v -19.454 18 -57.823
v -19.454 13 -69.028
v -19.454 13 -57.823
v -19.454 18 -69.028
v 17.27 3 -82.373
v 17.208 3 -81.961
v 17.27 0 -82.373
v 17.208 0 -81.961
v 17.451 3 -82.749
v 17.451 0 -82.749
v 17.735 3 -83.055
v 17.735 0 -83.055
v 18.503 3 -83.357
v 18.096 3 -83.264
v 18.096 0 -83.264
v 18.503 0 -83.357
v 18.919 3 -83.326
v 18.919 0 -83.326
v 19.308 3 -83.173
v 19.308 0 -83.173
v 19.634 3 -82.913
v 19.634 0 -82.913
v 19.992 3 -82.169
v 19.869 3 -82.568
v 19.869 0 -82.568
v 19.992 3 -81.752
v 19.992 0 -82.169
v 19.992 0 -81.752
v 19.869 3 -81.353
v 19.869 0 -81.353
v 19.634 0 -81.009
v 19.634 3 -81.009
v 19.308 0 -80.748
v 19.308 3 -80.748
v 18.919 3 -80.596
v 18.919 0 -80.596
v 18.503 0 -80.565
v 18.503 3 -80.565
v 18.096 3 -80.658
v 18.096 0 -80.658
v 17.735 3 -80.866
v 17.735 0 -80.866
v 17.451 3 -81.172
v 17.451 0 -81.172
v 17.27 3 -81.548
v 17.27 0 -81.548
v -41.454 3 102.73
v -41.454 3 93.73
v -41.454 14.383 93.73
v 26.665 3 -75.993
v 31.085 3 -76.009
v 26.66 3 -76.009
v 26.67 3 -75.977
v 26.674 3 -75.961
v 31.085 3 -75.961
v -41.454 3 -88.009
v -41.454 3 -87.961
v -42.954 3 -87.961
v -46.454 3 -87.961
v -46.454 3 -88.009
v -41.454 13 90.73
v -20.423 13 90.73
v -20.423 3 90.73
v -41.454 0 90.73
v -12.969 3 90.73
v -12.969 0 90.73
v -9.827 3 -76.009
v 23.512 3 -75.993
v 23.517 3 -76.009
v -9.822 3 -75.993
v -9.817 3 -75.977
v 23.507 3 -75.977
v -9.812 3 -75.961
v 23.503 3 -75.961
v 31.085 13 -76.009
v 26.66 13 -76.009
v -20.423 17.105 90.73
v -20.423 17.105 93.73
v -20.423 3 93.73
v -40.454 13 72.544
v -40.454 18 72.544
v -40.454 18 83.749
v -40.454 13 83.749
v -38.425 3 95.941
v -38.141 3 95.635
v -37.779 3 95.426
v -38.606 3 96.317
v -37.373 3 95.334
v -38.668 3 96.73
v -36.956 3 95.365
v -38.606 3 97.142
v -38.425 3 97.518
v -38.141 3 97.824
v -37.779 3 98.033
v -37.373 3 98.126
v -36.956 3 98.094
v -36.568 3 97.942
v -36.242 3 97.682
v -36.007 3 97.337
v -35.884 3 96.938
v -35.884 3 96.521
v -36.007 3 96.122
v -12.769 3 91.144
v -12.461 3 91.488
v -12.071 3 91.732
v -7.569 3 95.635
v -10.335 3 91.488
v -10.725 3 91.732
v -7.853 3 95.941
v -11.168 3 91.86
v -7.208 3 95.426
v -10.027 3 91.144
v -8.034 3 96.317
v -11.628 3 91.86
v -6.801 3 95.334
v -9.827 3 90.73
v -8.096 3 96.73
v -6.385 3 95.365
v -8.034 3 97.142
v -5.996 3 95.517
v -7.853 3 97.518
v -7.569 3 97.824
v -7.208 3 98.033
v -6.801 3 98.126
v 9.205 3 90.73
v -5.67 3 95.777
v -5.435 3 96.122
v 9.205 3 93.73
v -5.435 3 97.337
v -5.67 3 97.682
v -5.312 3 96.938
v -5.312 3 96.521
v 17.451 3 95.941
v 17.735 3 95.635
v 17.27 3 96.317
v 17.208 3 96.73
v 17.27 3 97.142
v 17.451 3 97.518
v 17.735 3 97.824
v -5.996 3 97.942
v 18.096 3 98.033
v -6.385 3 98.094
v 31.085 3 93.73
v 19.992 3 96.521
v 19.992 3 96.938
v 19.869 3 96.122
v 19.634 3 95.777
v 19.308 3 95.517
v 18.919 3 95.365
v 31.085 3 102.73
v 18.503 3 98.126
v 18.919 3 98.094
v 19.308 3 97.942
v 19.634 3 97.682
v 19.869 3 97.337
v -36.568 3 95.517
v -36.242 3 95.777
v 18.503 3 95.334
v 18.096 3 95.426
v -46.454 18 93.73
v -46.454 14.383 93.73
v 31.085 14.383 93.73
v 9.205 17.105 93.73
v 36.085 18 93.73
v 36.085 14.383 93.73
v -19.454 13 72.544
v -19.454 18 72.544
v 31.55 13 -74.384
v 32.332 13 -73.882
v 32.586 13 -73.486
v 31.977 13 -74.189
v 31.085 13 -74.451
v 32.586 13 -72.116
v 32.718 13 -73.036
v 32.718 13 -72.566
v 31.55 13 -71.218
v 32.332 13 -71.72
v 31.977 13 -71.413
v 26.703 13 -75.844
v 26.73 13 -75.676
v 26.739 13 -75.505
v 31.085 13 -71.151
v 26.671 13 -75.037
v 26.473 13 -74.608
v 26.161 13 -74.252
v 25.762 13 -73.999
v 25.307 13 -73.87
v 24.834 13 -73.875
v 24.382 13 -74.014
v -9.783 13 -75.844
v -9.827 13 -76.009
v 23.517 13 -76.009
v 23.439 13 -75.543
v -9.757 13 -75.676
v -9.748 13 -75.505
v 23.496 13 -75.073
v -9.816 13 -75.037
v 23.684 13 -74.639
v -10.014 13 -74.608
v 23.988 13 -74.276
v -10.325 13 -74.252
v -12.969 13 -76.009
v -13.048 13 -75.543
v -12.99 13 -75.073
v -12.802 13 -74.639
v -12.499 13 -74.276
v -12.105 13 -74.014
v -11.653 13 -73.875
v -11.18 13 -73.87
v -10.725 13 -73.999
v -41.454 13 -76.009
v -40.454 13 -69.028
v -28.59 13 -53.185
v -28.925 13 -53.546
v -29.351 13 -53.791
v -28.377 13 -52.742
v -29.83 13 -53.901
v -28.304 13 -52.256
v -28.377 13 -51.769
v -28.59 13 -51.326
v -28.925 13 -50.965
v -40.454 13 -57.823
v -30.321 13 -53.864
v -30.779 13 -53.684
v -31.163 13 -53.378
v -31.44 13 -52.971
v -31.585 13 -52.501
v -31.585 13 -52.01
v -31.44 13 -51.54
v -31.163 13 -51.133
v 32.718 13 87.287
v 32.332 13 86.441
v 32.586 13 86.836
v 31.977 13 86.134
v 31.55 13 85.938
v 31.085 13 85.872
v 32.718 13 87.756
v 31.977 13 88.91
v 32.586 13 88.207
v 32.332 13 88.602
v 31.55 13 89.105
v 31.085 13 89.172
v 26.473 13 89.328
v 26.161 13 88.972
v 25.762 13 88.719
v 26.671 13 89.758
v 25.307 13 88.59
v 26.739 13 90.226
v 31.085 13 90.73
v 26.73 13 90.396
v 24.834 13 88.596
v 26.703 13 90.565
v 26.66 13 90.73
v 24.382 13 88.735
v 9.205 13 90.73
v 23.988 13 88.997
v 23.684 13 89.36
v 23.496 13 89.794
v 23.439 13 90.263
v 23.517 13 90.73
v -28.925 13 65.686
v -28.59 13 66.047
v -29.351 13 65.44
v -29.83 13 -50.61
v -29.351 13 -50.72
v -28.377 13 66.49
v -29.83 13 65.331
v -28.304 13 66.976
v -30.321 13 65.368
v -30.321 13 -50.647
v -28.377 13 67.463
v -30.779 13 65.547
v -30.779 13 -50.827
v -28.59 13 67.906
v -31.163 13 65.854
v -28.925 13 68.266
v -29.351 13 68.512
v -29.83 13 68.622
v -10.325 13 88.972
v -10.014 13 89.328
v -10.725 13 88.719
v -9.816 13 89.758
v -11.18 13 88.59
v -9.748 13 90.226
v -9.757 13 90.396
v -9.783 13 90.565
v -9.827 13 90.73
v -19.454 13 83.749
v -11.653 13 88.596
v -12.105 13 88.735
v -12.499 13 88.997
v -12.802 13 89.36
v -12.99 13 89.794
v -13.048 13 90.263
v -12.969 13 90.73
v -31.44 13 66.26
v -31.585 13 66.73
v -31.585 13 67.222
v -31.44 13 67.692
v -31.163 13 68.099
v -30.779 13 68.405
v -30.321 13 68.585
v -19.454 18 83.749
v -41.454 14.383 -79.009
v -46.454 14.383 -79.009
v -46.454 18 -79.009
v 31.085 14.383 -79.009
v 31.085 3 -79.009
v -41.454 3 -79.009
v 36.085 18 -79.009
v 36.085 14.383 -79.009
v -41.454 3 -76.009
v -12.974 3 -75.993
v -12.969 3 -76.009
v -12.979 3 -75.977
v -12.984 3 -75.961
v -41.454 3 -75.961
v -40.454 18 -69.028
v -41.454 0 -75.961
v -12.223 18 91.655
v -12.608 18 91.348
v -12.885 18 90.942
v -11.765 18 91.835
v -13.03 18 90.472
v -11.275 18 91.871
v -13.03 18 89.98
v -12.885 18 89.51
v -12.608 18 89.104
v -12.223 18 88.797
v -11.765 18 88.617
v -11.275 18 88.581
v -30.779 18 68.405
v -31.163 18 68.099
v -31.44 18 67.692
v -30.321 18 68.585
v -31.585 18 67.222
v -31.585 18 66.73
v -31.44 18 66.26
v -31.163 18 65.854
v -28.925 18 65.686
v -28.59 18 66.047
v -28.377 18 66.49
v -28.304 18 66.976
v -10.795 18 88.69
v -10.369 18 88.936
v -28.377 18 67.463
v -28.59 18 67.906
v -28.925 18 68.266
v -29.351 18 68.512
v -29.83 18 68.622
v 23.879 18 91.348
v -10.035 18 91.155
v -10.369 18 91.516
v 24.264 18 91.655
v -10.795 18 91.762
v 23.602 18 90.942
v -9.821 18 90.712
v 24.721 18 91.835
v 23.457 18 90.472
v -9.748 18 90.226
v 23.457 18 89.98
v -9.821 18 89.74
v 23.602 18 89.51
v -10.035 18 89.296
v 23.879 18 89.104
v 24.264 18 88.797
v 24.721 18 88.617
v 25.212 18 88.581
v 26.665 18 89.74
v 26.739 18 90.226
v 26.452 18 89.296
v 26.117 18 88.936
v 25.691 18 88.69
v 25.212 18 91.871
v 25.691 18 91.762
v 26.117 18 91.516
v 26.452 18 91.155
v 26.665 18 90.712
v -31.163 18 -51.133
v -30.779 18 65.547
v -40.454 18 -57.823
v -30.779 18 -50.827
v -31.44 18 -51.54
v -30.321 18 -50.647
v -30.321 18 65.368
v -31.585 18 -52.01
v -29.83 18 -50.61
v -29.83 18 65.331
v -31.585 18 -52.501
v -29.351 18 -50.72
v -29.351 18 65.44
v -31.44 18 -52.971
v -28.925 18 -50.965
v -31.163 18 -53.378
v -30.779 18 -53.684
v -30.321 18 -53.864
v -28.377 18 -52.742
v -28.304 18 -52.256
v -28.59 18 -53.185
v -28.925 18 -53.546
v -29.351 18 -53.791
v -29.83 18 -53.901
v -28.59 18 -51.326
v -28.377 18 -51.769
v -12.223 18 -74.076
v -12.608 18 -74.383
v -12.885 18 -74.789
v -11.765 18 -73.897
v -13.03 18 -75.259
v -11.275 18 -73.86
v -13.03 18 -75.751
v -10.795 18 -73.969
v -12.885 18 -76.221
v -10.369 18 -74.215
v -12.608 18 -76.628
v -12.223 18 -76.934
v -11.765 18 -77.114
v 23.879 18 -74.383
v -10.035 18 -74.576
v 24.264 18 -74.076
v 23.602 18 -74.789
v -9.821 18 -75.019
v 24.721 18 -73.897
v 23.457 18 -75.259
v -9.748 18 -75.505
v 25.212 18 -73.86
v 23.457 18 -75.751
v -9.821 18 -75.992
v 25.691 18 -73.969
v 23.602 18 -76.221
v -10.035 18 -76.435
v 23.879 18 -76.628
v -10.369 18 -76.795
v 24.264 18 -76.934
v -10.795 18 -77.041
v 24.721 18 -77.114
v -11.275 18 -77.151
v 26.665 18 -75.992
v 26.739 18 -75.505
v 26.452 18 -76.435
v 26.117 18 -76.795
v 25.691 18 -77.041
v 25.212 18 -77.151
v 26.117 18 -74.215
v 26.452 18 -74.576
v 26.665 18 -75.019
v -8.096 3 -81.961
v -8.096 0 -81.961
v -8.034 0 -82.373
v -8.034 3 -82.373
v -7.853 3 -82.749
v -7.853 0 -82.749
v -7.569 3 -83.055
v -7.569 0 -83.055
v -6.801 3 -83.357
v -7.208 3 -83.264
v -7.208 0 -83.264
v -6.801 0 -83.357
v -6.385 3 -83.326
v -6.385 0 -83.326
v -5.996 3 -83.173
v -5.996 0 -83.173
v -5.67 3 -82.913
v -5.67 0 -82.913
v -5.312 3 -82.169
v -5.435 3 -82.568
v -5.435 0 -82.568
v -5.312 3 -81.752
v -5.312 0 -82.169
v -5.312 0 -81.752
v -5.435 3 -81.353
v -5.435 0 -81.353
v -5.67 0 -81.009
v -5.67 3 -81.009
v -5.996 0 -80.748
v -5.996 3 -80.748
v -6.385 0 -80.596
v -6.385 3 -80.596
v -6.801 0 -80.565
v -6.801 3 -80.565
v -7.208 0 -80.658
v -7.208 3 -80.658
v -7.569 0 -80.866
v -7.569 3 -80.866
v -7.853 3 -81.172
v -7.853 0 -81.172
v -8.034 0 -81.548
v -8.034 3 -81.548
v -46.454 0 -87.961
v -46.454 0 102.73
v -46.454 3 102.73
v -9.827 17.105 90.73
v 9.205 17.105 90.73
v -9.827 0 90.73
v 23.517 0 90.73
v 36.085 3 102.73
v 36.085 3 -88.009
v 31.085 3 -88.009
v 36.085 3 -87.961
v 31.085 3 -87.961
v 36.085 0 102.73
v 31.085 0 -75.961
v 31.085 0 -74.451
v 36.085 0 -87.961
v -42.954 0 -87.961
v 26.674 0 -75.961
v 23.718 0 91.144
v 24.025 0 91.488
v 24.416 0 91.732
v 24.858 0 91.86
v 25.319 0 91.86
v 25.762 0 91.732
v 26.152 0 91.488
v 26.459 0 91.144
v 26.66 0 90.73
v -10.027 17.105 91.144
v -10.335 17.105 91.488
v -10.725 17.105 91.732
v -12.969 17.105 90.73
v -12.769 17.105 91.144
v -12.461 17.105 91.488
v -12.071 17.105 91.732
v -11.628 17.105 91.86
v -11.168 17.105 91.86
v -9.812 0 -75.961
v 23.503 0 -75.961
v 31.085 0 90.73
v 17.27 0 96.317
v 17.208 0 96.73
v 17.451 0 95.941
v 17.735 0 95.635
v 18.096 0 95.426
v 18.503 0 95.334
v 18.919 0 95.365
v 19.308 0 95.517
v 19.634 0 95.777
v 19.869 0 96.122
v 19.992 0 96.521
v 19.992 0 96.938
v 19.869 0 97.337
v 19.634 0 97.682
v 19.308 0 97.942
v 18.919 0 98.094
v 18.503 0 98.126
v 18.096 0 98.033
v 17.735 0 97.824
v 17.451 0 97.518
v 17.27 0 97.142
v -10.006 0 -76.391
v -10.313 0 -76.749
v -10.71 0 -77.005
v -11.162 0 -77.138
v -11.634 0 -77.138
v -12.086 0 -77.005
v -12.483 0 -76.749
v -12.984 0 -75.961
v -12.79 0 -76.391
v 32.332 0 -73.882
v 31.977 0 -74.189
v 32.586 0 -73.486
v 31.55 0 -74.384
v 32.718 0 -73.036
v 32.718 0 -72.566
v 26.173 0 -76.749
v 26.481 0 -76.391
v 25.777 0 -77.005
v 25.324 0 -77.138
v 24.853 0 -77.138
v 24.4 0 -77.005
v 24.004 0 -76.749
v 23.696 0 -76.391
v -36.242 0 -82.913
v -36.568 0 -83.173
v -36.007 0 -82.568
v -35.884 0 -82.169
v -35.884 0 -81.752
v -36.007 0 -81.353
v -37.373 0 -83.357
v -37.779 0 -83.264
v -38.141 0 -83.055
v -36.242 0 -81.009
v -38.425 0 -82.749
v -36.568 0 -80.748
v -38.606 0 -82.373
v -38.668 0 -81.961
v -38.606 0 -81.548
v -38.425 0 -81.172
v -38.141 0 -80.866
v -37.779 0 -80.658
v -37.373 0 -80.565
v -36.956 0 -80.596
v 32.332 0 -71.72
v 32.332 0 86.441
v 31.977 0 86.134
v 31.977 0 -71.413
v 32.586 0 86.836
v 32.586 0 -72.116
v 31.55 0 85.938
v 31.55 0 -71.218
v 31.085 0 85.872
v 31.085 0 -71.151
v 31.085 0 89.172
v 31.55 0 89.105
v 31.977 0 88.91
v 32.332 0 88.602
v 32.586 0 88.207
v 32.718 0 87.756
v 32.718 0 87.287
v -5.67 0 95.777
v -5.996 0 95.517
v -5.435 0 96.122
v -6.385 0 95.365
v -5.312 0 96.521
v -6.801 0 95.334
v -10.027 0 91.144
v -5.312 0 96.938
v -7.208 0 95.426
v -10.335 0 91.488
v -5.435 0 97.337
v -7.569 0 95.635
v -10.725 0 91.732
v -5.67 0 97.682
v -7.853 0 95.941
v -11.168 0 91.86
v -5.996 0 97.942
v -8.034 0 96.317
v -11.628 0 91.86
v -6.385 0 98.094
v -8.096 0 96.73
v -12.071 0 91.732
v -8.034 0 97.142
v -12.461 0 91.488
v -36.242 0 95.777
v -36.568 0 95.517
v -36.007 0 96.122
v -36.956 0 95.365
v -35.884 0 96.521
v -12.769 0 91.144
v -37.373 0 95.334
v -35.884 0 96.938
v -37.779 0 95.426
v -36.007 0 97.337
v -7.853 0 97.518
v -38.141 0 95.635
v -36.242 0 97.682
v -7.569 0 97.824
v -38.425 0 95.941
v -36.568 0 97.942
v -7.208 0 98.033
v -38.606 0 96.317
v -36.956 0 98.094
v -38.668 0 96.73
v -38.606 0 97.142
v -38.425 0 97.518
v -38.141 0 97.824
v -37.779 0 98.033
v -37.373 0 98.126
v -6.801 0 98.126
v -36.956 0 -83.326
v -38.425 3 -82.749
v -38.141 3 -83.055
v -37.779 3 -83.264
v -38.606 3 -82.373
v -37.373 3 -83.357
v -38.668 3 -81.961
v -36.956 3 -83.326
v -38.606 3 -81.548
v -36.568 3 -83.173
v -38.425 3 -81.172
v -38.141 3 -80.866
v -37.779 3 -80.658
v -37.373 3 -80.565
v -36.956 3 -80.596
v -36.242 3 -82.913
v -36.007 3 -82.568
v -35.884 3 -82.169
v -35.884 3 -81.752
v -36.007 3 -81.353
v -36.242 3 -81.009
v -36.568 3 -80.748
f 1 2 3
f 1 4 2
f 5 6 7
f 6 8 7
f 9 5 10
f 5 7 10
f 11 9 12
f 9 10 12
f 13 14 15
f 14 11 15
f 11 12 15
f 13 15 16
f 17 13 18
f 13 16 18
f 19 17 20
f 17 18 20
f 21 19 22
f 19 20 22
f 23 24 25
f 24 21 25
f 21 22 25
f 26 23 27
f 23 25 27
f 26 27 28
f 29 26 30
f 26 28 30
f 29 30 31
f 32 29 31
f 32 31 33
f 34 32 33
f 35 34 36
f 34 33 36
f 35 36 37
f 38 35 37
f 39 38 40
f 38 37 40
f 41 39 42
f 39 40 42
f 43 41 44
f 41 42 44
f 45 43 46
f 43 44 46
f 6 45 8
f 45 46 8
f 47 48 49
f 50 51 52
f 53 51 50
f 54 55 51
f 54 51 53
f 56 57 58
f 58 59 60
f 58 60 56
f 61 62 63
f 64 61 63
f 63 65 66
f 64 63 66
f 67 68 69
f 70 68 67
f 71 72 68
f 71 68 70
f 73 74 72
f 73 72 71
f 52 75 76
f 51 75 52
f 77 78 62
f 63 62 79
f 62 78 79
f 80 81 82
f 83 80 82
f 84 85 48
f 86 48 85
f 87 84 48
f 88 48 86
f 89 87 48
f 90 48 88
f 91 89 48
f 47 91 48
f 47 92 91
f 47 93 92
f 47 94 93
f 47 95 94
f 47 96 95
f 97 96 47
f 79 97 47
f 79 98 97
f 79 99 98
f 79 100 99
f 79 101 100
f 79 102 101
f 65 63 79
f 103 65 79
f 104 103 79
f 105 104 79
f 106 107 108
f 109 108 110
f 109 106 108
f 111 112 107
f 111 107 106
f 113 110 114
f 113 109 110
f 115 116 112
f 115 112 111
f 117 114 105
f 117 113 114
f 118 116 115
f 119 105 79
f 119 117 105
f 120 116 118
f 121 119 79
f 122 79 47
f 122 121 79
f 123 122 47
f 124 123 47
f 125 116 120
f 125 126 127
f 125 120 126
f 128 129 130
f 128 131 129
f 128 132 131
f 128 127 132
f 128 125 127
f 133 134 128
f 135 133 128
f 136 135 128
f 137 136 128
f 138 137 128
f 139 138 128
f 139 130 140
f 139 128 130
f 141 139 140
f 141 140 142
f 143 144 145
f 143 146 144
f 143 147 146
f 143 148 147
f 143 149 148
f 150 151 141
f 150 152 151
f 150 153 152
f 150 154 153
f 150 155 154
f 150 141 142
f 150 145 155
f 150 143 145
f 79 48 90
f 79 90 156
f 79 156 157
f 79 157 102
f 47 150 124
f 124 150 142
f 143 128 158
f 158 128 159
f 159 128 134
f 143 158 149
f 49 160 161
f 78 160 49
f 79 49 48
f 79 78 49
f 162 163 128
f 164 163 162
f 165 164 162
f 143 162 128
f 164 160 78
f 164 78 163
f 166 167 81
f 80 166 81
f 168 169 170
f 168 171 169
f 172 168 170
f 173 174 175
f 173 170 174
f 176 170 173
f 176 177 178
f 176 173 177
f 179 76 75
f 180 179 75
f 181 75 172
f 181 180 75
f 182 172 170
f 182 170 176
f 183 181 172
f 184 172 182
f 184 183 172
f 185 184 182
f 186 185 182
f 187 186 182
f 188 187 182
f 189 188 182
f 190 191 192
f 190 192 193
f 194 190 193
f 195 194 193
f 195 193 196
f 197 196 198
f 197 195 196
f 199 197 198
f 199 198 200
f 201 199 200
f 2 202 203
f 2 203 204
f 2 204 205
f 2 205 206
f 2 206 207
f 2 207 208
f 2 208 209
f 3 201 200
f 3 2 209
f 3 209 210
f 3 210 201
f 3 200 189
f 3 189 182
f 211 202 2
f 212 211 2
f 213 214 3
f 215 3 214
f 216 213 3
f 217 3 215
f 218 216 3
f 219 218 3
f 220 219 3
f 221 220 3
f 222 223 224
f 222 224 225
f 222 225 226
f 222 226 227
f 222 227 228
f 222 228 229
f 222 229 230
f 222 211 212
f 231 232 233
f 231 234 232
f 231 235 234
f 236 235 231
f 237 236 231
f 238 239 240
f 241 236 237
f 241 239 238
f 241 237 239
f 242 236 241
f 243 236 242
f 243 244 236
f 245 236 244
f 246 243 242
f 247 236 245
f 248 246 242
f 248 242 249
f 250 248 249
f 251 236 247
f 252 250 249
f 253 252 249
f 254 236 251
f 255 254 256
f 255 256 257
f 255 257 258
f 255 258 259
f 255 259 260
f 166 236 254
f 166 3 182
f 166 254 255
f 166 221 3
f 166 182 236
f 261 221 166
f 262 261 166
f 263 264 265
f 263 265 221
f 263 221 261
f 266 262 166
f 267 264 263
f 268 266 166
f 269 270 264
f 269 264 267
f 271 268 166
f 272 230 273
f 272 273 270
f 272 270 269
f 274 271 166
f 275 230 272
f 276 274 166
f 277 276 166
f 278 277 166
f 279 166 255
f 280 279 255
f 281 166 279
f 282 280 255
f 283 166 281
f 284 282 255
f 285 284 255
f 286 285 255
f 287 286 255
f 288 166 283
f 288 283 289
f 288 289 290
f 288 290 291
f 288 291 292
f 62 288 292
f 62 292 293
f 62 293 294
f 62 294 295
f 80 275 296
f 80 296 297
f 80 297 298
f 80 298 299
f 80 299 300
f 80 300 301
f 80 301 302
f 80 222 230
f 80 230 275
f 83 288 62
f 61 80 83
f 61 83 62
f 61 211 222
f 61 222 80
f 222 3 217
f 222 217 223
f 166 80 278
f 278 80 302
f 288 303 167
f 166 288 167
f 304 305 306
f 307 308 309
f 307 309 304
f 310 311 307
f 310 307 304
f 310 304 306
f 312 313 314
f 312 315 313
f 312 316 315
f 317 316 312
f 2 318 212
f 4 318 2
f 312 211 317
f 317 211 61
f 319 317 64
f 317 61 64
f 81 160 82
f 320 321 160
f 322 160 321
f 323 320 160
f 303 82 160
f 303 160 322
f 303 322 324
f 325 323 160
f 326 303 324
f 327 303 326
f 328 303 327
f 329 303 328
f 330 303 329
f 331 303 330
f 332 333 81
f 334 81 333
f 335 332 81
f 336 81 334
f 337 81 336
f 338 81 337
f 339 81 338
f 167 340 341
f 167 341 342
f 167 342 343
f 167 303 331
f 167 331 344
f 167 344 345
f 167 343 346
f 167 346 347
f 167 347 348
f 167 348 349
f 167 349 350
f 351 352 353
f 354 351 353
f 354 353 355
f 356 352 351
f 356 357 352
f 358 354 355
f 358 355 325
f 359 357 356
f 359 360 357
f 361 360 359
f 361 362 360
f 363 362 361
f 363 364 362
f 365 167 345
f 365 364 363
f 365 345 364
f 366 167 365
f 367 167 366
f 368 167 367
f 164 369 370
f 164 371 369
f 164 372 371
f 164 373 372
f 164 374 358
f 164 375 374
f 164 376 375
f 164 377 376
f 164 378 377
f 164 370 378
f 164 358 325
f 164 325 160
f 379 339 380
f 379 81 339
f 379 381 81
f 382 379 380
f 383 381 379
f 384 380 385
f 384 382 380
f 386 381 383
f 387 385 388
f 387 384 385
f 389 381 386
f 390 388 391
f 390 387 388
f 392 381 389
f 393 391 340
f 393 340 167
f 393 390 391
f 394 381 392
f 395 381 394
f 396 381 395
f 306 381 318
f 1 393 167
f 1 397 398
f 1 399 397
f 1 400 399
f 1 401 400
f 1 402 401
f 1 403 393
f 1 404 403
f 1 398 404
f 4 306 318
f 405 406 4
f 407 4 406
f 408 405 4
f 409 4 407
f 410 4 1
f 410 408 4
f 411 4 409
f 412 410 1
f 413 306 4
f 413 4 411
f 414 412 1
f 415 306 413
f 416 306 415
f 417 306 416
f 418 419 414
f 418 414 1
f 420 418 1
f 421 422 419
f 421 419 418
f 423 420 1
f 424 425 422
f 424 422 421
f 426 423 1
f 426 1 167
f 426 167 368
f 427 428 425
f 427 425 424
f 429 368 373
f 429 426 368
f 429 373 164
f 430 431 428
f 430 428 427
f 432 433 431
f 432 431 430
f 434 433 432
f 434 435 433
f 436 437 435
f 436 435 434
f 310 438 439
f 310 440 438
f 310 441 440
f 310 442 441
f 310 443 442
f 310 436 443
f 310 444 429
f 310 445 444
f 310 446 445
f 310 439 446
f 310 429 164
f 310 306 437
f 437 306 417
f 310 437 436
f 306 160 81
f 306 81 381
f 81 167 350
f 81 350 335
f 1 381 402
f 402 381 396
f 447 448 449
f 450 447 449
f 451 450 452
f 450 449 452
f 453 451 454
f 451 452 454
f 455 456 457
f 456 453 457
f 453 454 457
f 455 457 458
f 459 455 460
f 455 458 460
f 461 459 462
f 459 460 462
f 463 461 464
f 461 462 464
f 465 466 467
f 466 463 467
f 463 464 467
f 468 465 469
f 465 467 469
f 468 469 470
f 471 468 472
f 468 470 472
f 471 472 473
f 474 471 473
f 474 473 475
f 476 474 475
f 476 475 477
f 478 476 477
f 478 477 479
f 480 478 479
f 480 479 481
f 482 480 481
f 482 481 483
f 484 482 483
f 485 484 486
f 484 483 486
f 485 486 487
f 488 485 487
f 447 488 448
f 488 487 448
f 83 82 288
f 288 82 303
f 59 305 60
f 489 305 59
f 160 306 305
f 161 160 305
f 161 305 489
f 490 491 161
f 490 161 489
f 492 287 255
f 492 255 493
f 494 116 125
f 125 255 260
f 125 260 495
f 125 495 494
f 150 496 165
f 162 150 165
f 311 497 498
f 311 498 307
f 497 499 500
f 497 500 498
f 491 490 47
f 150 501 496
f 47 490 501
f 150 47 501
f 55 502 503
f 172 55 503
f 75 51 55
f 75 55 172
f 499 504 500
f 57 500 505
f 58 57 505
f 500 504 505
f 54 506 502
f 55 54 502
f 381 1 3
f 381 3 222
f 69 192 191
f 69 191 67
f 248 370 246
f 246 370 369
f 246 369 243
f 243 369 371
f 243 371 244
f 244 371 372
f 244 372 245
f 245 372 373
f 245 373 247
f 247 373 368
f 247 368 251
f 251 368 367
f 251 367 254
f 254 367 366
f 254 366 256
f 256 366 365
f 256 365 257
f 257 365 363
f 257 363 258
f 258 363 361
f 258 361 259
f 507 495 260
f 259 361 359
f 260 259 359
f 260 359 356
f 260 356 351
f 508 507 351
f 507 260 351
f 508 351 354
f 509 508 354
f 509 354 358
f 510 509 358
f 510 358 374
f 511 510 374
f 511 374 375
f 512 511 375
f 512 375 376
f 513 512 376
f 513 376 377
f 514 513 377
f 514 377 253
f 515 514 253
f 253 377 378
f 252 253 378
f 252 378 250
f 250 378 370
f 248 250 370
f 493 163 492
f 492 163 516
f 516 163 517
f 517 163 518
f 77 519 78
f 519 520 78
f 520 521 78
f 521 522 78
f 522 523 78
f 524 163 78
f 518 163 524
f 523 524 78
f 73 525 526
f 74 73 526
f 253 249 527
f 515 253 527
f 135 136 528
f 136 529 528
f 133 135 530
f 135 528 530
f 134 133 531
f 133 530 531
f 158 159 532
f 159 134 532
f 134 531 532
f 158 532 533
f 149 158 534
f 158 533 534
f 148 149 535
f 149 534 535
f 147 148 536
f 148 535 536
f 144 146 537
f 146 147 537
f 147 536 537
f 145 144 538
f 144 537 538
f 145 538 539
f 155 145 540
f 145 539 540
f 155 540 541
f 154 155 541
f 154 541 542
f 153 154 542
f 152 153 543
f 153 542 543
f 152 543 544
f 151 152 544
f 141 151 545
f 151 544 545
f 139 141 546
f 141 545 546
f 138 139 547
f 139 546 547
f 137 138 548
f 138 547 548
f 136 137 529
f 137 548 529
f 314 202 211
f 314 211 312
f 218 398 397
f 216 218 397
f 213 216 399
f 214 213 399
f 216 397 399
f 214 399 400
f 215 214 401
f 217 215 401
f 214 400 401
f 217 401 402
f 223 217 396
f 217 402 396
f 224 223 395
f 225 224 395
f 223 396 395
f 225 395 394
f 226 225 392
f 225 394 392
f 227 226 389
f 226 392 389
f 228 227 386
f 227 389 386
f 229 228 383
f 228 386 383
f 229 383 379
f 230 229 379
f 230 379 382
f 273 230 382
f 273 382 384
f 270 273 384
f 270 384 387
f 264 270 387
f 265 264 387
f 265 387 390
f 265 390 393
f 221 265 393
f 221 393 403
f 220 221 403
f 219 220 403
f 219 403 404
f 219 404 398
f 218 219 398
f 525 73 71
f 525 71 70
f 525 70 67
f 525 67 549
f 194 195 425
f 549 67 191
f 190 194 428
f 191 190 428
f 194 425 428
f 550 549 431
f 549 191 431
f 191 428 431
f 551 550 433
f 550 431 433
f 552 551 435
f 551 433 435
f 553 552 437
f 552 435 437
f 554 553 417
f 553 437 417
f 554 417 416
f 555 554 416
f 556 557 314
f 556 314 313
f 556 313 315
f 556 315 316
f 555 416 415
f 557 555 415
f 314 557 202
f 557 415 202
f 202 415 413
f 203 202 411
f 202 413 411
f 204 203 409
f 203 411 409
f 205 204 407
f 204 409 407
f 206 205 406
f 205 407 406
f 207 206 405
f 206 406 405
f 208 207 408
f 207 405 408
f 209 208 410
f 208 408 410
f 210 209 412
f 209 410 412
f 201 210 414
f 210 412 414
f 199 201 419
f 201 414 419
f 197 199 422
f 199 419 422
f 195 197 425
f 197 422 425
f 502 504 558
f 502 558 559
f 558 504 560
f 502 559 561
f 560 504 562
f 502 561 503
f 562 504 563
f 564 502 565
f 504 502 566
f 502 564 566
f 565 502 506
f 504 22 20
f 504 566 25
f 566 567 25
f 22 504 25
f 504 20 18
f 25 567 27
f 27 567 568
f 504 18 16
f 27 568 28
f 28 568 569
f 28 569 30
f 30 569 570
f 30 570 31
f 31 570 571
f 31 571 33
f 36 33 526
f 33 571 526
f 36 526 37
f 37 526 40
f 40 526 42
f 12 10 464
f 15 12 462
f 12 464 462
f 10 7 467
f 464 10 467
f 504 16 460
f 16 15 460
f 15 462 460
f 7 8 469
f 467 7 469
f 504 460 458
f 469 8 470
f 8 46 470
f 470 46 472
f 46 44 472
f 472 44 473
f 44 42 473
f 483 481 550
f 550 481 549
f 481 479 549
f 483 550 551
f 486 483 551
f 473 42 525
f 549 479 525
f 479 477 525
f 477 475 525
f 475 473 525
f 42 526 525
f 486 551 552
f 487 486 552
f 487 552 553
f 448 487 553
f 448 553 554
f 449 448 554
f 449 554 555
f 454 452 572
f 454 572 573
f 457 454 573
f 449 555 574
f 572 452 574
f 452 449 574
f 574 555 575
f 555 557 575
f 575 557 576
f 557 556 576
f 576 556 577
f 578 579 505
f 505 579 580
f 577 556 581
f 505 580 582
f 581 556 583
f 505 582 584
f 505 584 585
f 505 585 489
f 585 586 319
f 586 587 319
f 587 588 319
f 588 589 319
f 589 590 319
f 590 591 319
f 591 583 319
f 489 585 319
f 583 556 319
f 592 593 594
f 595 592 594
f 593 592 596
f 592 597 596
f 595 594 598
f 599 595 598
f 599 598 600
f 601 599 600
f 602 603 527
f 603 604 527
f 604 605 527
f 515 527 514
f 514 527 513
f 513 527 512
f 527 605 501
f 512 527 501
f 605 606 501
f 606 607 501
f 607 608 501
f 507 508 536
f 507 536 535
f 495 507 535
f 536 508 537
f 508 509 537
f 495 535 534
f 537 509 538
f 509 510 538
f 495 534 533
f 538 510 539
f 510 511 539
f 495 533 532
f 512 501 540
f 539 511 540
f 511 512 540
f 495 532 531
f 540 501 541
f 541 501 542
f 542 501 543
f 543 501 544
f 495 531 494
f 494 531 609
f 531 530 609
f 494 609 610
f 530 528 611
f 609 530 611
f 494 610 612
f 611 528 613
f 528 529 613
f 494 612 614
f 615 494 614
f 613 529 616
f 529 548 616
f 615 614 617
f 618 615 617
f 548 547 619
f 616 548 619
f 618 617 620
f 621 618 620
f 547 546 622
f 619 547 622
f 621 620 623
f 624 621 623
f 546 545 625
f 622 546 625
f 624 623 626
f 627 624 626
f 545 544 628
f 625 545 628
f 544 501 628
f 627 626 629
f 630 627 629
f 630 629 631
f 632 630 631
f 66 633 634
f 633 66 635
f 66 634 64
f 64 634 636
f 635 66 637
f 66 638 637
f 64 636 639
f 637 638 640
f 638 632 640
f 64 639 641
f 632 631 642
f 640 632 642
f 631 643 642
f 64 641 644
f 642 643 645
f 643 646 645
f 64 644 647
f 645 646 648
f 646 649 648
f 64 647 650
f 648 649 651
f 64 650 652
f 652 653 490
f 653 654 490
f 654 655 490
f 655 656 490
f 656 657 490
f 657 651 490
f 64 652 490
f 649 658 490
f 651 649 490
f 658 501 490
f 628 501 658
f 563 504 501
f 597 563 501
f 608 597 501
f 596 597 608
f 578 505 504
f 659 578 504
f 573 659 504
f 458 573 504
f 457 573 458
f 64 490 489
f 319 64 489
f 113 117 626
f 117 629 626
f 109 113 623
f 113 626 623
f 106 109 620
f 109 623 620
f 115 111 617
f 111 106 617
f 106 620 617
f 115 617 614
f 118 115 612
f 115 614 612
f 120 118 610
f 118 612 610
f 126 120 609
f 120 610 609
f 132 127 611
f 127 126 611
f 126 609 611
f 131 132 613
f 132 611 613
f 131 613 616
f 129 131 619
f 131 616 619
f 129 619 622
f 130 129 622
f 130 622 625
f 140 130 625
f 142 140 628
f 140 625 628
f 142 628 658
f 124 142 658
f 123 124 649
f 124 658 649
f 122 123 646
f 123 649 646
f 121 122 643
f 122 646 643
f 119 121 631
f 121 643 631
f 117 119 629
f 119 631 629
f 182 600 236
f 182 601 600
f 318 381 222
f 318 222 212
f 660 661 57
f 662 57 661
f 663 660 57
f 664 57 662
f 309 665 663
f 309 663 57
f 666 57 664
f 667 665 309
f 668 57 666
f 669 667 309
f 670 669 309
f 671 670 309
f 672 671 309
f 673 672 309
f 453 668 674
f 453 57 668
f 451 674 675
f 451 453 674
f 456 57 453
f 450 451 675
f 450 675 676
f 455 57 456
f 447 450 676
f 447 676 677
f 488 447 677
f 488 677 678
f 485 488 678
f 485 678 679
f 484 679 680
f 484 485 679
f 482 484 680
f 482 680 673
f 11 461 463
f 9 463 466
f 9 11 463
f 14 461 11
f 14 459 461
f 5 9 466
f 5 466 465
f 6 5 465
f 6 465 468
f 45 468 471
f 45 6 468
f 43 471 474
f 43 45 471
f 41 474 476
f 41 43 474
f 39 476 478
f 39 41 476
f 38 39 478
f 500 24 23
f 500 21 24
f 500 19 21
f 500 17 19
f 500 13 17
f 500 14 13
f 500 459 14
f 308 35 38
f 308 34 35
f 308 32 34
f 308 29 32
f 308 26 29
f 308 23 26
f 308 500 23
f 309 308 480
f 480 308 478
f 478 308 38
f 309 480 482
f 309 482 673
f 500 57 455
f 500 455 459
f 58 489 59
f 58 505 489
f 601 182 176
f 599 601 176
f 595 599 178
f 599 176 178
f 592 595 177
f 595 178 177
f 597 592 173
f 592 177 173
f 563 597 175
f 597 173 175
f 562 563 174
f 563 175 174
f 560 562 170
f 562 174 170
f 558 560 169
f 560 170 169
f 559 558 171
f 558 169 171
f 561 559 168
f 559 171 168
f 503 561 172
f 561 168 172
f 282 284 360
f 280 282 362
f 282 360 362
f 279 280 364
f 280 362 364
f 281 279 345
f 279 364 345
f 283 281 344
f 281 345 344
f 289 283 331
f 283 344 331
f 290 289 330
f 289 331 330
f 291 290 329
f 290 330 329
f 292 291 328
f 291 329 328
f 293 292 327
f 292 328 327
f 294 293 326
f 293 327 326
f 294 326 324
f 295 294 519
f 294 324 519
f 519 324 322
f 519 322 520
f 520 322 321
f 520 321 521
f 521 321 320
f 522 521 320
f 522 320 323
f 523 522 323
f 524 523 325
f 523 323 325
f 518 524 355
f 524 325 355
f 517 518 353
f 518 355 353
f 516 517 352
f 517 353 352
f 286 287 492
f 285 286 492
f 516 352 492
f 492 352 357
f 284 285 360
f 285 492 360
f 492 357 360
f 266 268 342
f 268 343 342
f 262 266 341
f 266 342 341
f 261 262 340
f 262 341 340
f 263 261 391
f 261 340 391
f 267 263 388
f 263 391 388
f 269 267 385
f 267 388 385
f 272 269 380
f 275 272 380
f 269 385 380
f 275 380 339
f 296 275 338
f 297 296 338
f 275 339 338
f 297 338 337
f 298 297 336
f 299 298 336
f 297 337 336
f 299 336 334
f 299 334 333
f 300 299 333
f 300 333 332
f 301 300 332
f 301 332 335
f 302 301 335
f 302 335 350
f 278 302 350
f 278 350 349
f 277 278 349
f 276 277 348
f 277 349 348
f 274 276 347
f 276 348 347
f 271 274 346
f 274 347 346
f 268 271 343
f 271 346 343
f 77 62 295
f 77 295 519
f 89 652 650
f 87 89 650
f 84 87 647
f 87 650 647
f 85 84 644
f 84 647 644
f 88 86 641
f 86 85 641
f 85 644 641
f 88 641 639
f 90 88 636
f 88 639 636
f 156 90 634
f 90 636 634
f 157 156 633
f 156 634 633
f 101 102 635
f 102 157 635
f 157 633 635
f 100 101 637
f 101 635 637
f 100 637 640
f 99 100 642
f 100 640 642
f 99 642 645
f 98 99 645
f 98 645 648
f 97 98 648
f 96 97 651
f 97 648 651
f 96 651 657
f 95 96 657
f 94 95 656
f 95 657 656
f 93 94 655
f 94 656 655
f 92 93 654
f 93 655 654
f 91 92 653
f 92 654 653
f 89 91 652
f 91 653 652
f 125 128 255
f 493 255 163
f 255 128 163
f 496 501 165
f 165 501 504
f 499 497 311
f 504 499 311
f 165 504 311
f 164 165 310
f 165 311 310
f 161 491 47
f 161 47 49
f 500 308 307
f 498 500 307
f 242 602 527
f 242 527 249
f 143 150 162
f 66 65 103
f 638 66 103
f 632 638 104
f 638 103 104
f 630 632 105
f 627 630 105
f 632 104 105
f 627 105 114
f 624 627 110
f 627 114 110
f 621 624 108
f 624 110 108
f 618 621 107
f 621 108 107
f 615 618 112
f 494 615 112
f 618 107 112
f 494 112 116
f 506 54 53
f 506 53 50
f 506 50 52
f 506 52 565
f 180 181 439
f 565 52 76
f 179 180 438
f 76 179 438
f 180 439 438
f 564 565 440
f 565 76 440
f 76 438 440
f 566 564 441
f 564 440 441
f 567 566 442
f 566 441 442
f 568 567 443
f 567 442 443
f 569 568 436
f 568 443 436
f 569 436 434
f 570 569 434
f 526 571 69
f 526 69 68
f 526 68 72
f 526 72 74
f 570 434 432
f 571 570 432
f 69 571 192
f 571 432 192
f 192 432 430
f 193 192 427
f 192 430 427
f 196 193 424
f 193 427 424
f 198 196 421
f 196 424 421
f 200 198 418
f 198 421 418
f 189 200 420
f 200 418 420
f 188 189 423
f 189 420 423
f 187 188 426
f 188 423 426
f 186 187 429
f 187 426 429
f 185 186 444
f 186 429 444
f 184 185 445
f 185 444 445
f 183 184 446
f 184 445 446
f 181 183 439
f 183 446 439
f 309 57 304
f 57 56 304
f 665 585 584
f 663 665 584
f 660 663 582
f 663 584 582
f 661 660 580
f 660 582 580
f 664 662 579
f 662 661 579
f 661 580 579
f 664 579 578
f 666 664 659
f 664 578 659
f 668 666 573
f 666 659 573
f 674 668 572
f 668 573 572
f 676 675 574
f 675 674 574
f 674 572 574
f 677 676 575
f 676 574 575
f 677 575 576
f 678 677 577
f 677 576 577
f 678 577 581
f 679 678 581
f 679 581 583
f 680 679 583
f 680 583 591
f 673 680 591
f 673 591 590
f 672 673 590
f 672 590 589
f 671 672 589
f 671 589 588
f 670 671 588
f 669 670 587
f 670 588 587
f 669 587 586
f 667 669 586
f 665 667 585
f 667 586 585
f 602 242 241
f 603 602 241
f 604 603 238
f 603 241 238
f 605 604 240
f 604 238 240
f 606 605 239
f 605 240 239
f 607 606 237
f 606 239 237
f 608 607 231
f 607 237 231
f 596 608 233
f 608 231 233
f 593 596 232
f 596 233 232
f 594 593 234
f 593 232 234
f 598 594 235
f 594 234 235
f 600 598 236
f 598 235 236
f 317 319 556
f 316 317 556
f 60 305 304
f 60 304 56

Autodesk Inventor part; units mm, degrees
ref_plane "YZ Plane" through (0, 0, 0) normal (1, 0, 0) x (0, 1, 0)
ref_plane "XZ Plane" through (0, 0, 0) normal (0, 1, 0) x (-1, 0, 0)
ref_plane "XY Plane" through (0, 0, 0) normal (0, 0, 1) x (1, 0, 0)
sketch "Sketch1" plane through (0, 0, 0) normal (0, 1, 0) x (-1, 0, 0)
  line L0 (-36.0847, -75.9608) -> (-36.0847, -87.9608)
  line L1 (-36.0847, -87.9608) -> (42.9536, -87.9608)
  line L2 (42.9536, -87.9608) -> (42.9536, -75.9608)
  line L3 (42.9536, -75.9608) -> (-36.0847, -75.9608)
  line L4 (-36.0847, -75.9608) -> (-36.0847, -87.9608)
  circle A0 centre (-18.6075, -81.9608) radius 1.4
  circle A1 centre (-18.6075, -81.9608) radius 1.4
  circle A2 centre (6.6962, -81.9608) radius 1.4
  circle A3 centre (6.6962, -81.9608) radius 1.4
  circle A4 centre (37.2679, -81.9608) radius 1.4
  circle A5 centre (37.2679, -81.9608) radius 1.4
  line L5 (-36.0847, 90.7296) -> (-36.0847, 102.7296)
  line L6 (-36.0847, 102.7296) -> (42.9536, 102.7296)
  line L7 (42.9536, 102.7296) -> (42.9536, 90.7296)
  line L8 (42.9536, 90.7296) -> (-36.0847, 90.7296)
  line L9 (-36.0847, 90.7296) -> (-36.0847, 102.7296)
  circle A6 centre (-18.6075, 96.7296) radius 1.4
  circle A7 centre (-18.6075, 96.7296) radius 1.4
  circle A8 centre (6.6962, 96.7296) radius 1.4
  circle A9 centre (6.6962, 96.7296) radius 1.4
  circle A10 centre (37.2679, 96.7296) radius 1.4
  circle A11 centre (37.2679, 96.7296) radius 1.4
  point P0 (0, 0)
  point P1 (-48.8522, 7.3844)
extrude "Extrusion1" add sketch "Sketch1" along normal blind 3
sketch "Sketch2" plane through (0, 3, 0) normal (0, 1, 0) x (1, 0, 0)
  line L0 (36.0847, -90.7296) -> (-42.9536, -90.7296) projected
  line L1 (-42.9536, -90.7296) -> (-42.9536, -102.7296) projected
  line L2 (36.0847, -90.7296) -> (-42.9536, -90.7296)
  line L3 (-42.9536, -90.7296) -> (-42.9536, -93.7296)
  line L4 (-42.9536, -93.7296) -> (36.0847, -93.7296)
  line L5 (36.0847, -93.7296) -> (36.0847, -90.7296)
  line L6 (-42.9536, 76.0091) -> (36.0847, 76.0091)
  line L7 (36.0847, 76.0091) -> (36.0847, 79.0091)
  line L8 (36.0847, 79.0091) -> (-42.9536, 79.0091)
  line L9 (-42.9536, 79.0091) -> (-42.9536, 76.0091)
  point P0 (0, 0)
  dimension "d2" = 3
  dimension "d3" = 3
extrude "Extrusion2" add sketch "Sketch2" along normal blind 25
sketch "Sketch3" plane through (-42.9536, 3, -76.0091) normal (0, 0, 1) x (1, 0, 0)
  line L0 (0, 0) -> (0, 25) projected
  line L1 (79.0383, 0) -> (79.0383, 25) projected
  line L2 (0, 25) -> (79.0383, 25)
  line L3 (79.0383, 25) -> (79.0383, 20)
  line L4 (79.0383, 20) -> (0, 20)
  line L5 (0, 20) -> (0, 25)
  point P0 (42.9536, -3)
  point P1 (0, 20)
  dimension "d6" = 5
extrude "Extrusion3" add sketch "Sketch3" along normal blind 168
sketch "Sketch4" plane through (-42.9536, 3, 93.7296) normal (0, 0, 1) x (1, 0, 0)
  line L0 (79.0383, 0) -> (0, 0) projected
  line L1 (22.5307, 0) -> (52.1586, 0)
  line L2 (52.1586, 0) -> (52.1586, 14.1048)
  line L3 (52.1586, 14.1048) -> (22.5307, 14.1048)
  line L4 (22.5307, 14.1048) -> (22.5307, 0)
  point P0 (42.9536, -3)
extrude "Extrusion4" cut sketch "Sketch4" against normal blind 20
sketch "Sketch5" plane through (36.0847, 0, 102.7296) normal (1, 0, 0) x (0, 0, -1)
  line L0 (0, 3) -> (9, 3) projected
  line L1 (0, 3) -> (9, 14.3829)
  line L2 (9, 3) -> (9, 28) projected
  line L3 (0, 0) -> (0, 3) projected
  line L4 (0, 3) -> (9, 3)
  line L5 (9, 14.3829) -> (9, 3)
  point P0 (102.7296, 0)
extrude "Extrusion5" add sketch "Sketch5" against normal blind 5
sketch "Sketch7" plane through (36.0847, 0, 102.7296) normal (1, 0, 0) x (0, 0, -1)
  line L0 (190.7387, 3) -> (181.7387, 14.3829)
  line L1 (181.7387, 14.3829) -> (190.7387, 3)
  line L2 (181.7387, 3) -> (190.7387, 3)
  line L3 (190.7387, 3) -> (181.7387, 3)
  line L4 (181.7387, 3) -> (181.7387, 14.3829)
  point P0 (102.7296, 0)
extrude "Extrusion7" add sketch "Sketch7" against normal blind 5
sketch "Sketch10" plane through (36.0847, 3, -76.0091) normal (0, 0, 1) x (1, 0, 0)
  line L0 (0, -3) -> (0, 0) projected
  line L1 (0, 20) -> (-79.0383, 20) projected
  line L2 (0, -3) -> (-5, -3)
  line L3 (-5, -3) -> (-5, 20)
  line L4 (-5, 20) -> (0, 20)
  line L5 (0, 20) -> (0, -3)
  point P0 (-36.0847, -3)
  point P1 (-74.0383, 20)
  dimension "d22" = 5
extrude "Extrusion10" add sketch "Sketch10" along normal blind 168
sketch "Sketch11" plane through (0, 28, 0) normal (0, 1, 0) x (1, 0, 0)
  line L0 (-42.9536, 79.0091) -> (-42.9536, -93.7296) projected
  line L1 (-42.9536, -7.3603) -> (36.0847, -7.3603)
  line L2 (36.0847, -93.7296) -> (36.0847, 79.0091) projected
  point P0 (0, 0)
sketch "Sketch12" plane through (-42.9536, 0, -87.9608) normal (-1, 0, 0) x (0, 0, 1)
  line L0 (0, 0) -> (190.6905, 0) projected
  line L1 (0, 0) -> (0, 3) projected
  line L2 (0, 0) -> (0, 3)
  point P0 (87.9608, 0)
sketch "Sketch13" plane through (-42.9536, 0, 90.7296) normal (-1, 0, 0) x (0, 0, 1)
  line L0 (-178.6905, 0) -> (-178.6905, 3) projected
  line L1 (-178.6905, 0) -> (-178.6905, 3)
  line L2 (-169.7387, 3) -> (-169.7387, 28) projected
  line L3 (-178.6905, 3) -> (-169.7387, 3)
  line L4 (-169.7387, 28) -> (3, 28) projected
  line L5 (-169.7387, 3) -> (-169.7387, 28)
  line L6 (-169.7387, 28) -> (3, 28)
  line L7 (3, 28) -> (3, 3)
  line L8 (12, 0) -> (12, 3) projected
  line L9 (3, 3) -> (12, 3)
  line L10 (12, 3) -> (12, 0)
  line L11 (0, 23) -> (0, 0) projected
  line L12 (12, 0) -> (0, 0)
  line L13 (0, 0) -> (0, 23)
  line L14 (-166.7387, 3) -> (-166.7387, 23) projected
  line L15 (0, 23) -> (-166.7387, 23)
  line L16 (-166.7387, 23) -> (-166.7387, 0)
  line L17 (-166.7387, 0) -> (-178.6905, 0)
  point P0 (-90.7296, 0)
extrude "Extrusion11" add sketch "Sketch13" along normal blind 3.5
sketch "Sketch14" plane through (-46.4536, 0, 90.7296) normal (-1, 0, 0) x (0, 0, 1)
  line L0 (-169.7387, 14.3829) -> (-178.7387, 3) projected
  line L1 (12, 3) -> (3, 14.3829) projected
  line L2 (-169.7387, 3) -> (-178.6905, 3) projected
  line L3 (-178.7387, 3) -> (-169.7387, 3)
  line L4 (-169.7387, 3) -> (-169.7387, 14.3829)
  line L5 (-169.7387, 14.3829) -> (-178.7387, 3)
  line L6 (3, 14.3829) -> (3, 3)
  line L7 (3, 3) -> (12, 3)
  line L8 (3, 14.3829) -> (12, 3)
  point P0 (-90.7296, 0)
extrude "Extrusion12" add sketch "Sketch14" against normal blind 5
sketch "Sketch15" plane through (31.0847, 0, 90.7296) normal (0, 0, -1) x (-1, 0, 0)
  line L0 (77.5383, 23) -> (77.5383, 0) projected
  line L1 (0, 0) -> (77.5383, 0) projected
  line L2 (77.5383, 23) -> (72.5383, 23)
  line L3 (72.5383, 23) -> (72.5383, 0)
  line L4 (72.5383, 0) -> (77.5383, 0)
  line L5 (77.5383, 0) -> (77.5383, 23)
  point P0 (31.0847, 0)
  dimension "d29" = 5
extrude "Extrusion13" add sketch "Sketch15" along normal blind 168
sketch "Sketch16" plane through (0, 28, 0) normal (0, 1, 0) x (1, 0, 0)
  line L0 (31.0847, 75.9608) -> (31.0847, -90.7296) projected
  circle A0 centre (31.0847, 72.801) radius 1.65
  circle A1 centre (-37.2679, 72.801) radius 1.65
  circle A2 centre (-6.278, 72.801) radius 1.65
  line L1 (-42.9536, -7.3603) -> (36.0847, -7.3603) projected
  circle A3 centre (31.0847, -87.5216) radius 1.65
  circle A4 centre (-37.2679, -87.5216) radius 1.65
  circle A5 centre (-6.278, -87.5216) radius 1.65
  point P0 (0, 0)
  point P1 (31.0847, -90.6814)
  dimension "d32" = 3.3
  dimension "d33" = 3.3
extrude "Extrusion14" cut sketch "Sketch16" against normal blind 168
sketch "Sketch17" plane through (0, 28, 0) normal (0, 1, 0) x (1, 0, 0)
  line L0 (36.0847, 79.0091) -> (-46.4536, 79.0091) projected
  line L1 (31.0847, -93.7296) -> (36.0847, -93.7296) projected
  line L2 (-46.4536, 79.0091) -> (36.0847, 79.0091)
  line L3 (36.0847, 79.0091) -> (36.0847, -93.7296)
  line L4 (36.0847, -93.7296) -> (-46.4536, -93.7296)
  line L5 (-46.4536, -93.7296) -> (-46.4536, 79.0091)
  arc A0 (31.0847, -89.1716) -> (31.0847, -85.8716) centre (31.0847, -87.5216) ccw projected
  circle A1 centre (31.0847, -87.5216) radius 1.65
  circle A2 centre (-6.278, -87.5216) radius 1.65 projected
  circle A3 centre (-6.278, -87.5216) radius 1.65
  circle A4 centre (-37.2679, -87.5216) radius 1.65 projected
  circle A5 centre (-37.2679, -87.5216) radius 1.65
  circle A6 centre (-37.2679, 72.801) radius 1.65 projected
  circle A7 centre (-37.2679, 72.801) radius 1.65
  circle A8 centre (-6.278, 72.801) radius 1.65 projected
  circle A9 centre (-6.278, 72.801) radius 1.65
  arc A10 (31.0847, 71.151) -> (31.0847, 74.451) centre (31.0847, 72.801) ccw projected
  circle A11 centre (31.0847, 72.801) radius 1.65
  point P0 (0, 0)
  point P1 (31.0847, -85.8716)
extrude "Extrusion15" cut sketch "Sketch17" against normal blind 10
sketch "Sketch18" plane through (-41.4536, 0, 90.7296) normal (1, 0, 0) x (0, 0, -1)
  line L0 (166.7387, 18) -> (0, 18) projected
  line L1 (166.7387, 18) -> (166.7387, 3) projected
  line L2 (0, 18) -> (166.7387, 18)
  line L3 (166.7387, 18) -> (166.7387, 13)
  line L4 (166.7387, 13) -> (0, 13)
  line L5 (0, 13) -> (0, 18)
  point P0 (90.7296, 0)
  dimension "d38" = 5
extrude "Extrusion16" add sketch "Sketch18" along normal blind 75
sketch "Sketch19" plane through (0, 18, 0) normal (0, 1, 0) x (1, 0, 0)
  line L0 (33.4512, -7.3603) -> (-16.5488, -7.3603)
  line L1 (-16.5488, -7.3603) -> (-16.5488, 69.1397)
  line L2 (-16.5488, 69.1397) -> (33.4512, 69.1397)
  line L3 (33.4512, 69.1397) -> (33.4512, -7.3603)
  line L4 (33.4512, -7.3603) -> (-16.5488, -7.3603)
  line L5 (-16.5488, -7.3603) -> (-16.5488, -83.8603)
  line L6 (-16.5488, -83.8603) -> (33.4512, -83.8603)
  line L7 (33.4512, -83.8603) -> (33.4512, -7.3603)
  line L8 (36.0847, 79.0091) -> (36.0847, -93.7296) projected
  line L9 (36.0847, -7.3603) -> (-18.6839, -7.3603)
  line L10 (-18.6839, -7.3603) -> (-18.6839, -86.5599)
  line L11 (-18.6839, -86.5599) -> (36.0847, -86.5599)
  line L12 (36.0847, -86.5599) -> (36.0847, -7.3603)
  line L13 (-18.6839, 71.8393) -> (36.0847, 71.8393)
  line L14 (-18.6839, -7.3603) -> (-18.6839, 71.8393)
  circle A0 centre (-11.398, -90.2259) radius 1.65
  circle A1 centre (25.0886, -90.2259) radius 1.65
  line L15 (36.0847, -86.5599) -> (36.0847, -93.7296)
  line L16 (36.0847, -93.7296) -> (-18.6839, -93.7296)
  line L17 (-20.4229, -90.7296) -> (9.205, -90.7296) projected
  line L18 (-18.6839, -93.7296) -> (-18.6839, -86.5599)
  line L19 (-18.6839, 71.8393) -> (36.0847, 71.8393)
  circle A2 centre (-11.398, 75.5053) radius 1.65
  circle A3 centre (25.0886, 75.5053) radius 1.65
  line L20 (36.0847, 71.8393) -> (36.0847, 79.0091)
  line L21 (36.0847, 79.0091) -> (-18.6839, 79.0091)
  line L22 (-20.4229, 76.0091) -> (9.205, 76.0091)
  line L23 (-18.6839, 79.0091) -> (-18.6839, 71.8393)
  point P0 (0, 0)
  dimension "d41" = 50
  dimension "d42" = 76.5
  dimension "d43" = 76.5
  dimension "d44" = 3.3
  dimension "d45" = 3.3
extrude "Extrusion17" cut sketch "Sketch19" against normal blind 75 contours A2 L22 | L22 A2 | A0 L17 | L17 A0 | A1 | A3
sketch "Sketch20" plane through (0, 18, 0) normal (0, 1, 0) x (1, 0, 0)
  circle A0 centre (-11.398, 75.5053) radius 1.65 projected
  line L0 (-11.398, 75.5053) -> (-37.0391, 75.5053)
  line L1 (-12.9693, 76.0091) -> (-41.4536, 76.0091) projected
  circle A1 centre (-37.0391, 75.5053) radius 1.65
  line L2 (-42.9536, -7.3603) -> (36.0847, -7.3603) projected
  circle A2 centre (-37.0391, -90.2259) radius 1.65
  line L3 (-46.4536, -93.7296) -> (-46.4536, 79.0091) projected
  line L4 (-46.4536, -7.3603) -> (-19.4536, -7.3603)
  line L5 (-19.4536, -7.3603) -> (-40.4536, -7.3603)
  line L6 (-40.4536, -7.3603) -> (-40.4536, 47.6397)
  line L7 (-40.4536, 47.6397) -> (-19.4536, 47.6397)
  line L8 (-19.4536, 47.6397) -> (-19.4536, -7.3603)
  line L9 (-19.4536, -7.3603) -> (-40.4536, -7.3603)
  line L10 (-40.4536, -7.3603) -> (-40.4536, -62.3603)
  line L11 (-40.4536, -62.3603) -> (-19.4536, -62.3603)
  line L12 (-19.4536, -62.3603) -> (-19.4536, -7.3603)
  circle A3 centre (-29.9536, 52.2555) radius 1.65
  line L13 (-29.9536, -62.3603) -> (-29.9536, -66.9763)
  circle A4 centre (-29.9536, -66.9763) radius 1.65
  line L14 (-19.4536, -72.5437) -> (-40.4536, -72.5437)
  line L15 (-40.4536, -72.5437) -> (-40.4536, -83.7487)
  line L16 (-40.4536, -83.7487) -> (-19.4536, -83.7487)
  line L17 (-19.4536, -83.7487) -> (-19.4536, -72.5437)
  line L18 (-19.4536, 57.8231) -> (-40.4536, 57.8231)
  line L19 (-40.4536, 57.8231) -> (-40.4536, 69.0282)
  line L20 (-40.4536, 69.0282) -> (-19.4536, 69.0282)
  line L21 (-19.4536, 69.0282) -> (-19.4536, 57.8231)
  point P0 (0, 0)
  point P1 (-41.4536, -90.7296)
  dimension "d48" = 3.3
  dimension "d49" = 27
  dimension "d50" = 21
  dimension "d51" = 55
  dimension "d52" = 55
  dimension "d53" = 3.3
  dimension "d54" = 4.616
  dimension "d55" = 3.3
extrude "Extrusion18" cut sketch "Sketch20" against normal blind 75 contours A4 | A3 | L17 L16 L15 L14 | L18 L19 L20 L21
sketch "Sketch21" plane through (0, 18, 0) normal (0, 1, 0) x (1, 0, 0)
  line L0 (-42.9536, -7.3603) -> (36.0847, -7.3603) projected
  line L1 (-29.9536, -7.3603) -> (-17.4536, -7.3603)
  line L2 (-17.4536, -7.3603) -> (-17.4536, -62.3603)
  line L3 (-17.4536, -62.3603) -> (-29.9536, -62.3603)
  line L4 (-29.9536, -62.3603) -> (-29.9536, -7.3603)
  line L5 (-29.9536, -7.3603) -> (-42.4536, -7.3603)
  line L6 (-42.4536, -7.3603) -> (-42.4536, -62.3603)
  line L7 (-42.4536, -62.3603) -> (-29.9536, -62.3603)
  line L8 (-17.4536, -7.3603) -> (-17.4536, 47.6397)
  line L9 (-17.4536, 47.6397) -> (-29.9536, 47.6397)
  line L10 (-29.9536, 47.6397) -> (-29.9536, -7.3603)
  line L11 (-42.4536, -7.3603) -> (-42.4536, 47.6397)
  line L12 (-42.4536, 47.6397) -> (-29.9536, 47.6397)
  line L13 (-17.4536, 47.6397) -> (-42.4536, 47.6397)
  line L14 (-42.4536, 47.6397) -> (-42.4536, 56.0699)
  line L15 (-42.4536, 56.0699) -> (-17.4536, 56.0699)
  line L16 (-17.4536, 56.0699) -> (-17.4536, 47.6397)
  line L17 (-17.4536, -62.3603) -> (-29.9536, -62.3603)
  line L18 (-42.4536, -62.3603) -> (-29.9536, -62.3603)
  line L19 (-17.4536, -62.3603) -> (-42.4536, -62.3603)
  line L20 (-42.4536, -62.3603) -> (-42.4536, -70.7904)
  line L21 (-42.4536, -70.7904) -> (-17.4536, -70.7904)
  line L22 (-17.4536, -70.7904) -> (-17.4536, -62.3603)
  point P0 (0, 0)
  dimension "d58" = 12.5
  dimension "d59" = 55
properties part number "atap"
